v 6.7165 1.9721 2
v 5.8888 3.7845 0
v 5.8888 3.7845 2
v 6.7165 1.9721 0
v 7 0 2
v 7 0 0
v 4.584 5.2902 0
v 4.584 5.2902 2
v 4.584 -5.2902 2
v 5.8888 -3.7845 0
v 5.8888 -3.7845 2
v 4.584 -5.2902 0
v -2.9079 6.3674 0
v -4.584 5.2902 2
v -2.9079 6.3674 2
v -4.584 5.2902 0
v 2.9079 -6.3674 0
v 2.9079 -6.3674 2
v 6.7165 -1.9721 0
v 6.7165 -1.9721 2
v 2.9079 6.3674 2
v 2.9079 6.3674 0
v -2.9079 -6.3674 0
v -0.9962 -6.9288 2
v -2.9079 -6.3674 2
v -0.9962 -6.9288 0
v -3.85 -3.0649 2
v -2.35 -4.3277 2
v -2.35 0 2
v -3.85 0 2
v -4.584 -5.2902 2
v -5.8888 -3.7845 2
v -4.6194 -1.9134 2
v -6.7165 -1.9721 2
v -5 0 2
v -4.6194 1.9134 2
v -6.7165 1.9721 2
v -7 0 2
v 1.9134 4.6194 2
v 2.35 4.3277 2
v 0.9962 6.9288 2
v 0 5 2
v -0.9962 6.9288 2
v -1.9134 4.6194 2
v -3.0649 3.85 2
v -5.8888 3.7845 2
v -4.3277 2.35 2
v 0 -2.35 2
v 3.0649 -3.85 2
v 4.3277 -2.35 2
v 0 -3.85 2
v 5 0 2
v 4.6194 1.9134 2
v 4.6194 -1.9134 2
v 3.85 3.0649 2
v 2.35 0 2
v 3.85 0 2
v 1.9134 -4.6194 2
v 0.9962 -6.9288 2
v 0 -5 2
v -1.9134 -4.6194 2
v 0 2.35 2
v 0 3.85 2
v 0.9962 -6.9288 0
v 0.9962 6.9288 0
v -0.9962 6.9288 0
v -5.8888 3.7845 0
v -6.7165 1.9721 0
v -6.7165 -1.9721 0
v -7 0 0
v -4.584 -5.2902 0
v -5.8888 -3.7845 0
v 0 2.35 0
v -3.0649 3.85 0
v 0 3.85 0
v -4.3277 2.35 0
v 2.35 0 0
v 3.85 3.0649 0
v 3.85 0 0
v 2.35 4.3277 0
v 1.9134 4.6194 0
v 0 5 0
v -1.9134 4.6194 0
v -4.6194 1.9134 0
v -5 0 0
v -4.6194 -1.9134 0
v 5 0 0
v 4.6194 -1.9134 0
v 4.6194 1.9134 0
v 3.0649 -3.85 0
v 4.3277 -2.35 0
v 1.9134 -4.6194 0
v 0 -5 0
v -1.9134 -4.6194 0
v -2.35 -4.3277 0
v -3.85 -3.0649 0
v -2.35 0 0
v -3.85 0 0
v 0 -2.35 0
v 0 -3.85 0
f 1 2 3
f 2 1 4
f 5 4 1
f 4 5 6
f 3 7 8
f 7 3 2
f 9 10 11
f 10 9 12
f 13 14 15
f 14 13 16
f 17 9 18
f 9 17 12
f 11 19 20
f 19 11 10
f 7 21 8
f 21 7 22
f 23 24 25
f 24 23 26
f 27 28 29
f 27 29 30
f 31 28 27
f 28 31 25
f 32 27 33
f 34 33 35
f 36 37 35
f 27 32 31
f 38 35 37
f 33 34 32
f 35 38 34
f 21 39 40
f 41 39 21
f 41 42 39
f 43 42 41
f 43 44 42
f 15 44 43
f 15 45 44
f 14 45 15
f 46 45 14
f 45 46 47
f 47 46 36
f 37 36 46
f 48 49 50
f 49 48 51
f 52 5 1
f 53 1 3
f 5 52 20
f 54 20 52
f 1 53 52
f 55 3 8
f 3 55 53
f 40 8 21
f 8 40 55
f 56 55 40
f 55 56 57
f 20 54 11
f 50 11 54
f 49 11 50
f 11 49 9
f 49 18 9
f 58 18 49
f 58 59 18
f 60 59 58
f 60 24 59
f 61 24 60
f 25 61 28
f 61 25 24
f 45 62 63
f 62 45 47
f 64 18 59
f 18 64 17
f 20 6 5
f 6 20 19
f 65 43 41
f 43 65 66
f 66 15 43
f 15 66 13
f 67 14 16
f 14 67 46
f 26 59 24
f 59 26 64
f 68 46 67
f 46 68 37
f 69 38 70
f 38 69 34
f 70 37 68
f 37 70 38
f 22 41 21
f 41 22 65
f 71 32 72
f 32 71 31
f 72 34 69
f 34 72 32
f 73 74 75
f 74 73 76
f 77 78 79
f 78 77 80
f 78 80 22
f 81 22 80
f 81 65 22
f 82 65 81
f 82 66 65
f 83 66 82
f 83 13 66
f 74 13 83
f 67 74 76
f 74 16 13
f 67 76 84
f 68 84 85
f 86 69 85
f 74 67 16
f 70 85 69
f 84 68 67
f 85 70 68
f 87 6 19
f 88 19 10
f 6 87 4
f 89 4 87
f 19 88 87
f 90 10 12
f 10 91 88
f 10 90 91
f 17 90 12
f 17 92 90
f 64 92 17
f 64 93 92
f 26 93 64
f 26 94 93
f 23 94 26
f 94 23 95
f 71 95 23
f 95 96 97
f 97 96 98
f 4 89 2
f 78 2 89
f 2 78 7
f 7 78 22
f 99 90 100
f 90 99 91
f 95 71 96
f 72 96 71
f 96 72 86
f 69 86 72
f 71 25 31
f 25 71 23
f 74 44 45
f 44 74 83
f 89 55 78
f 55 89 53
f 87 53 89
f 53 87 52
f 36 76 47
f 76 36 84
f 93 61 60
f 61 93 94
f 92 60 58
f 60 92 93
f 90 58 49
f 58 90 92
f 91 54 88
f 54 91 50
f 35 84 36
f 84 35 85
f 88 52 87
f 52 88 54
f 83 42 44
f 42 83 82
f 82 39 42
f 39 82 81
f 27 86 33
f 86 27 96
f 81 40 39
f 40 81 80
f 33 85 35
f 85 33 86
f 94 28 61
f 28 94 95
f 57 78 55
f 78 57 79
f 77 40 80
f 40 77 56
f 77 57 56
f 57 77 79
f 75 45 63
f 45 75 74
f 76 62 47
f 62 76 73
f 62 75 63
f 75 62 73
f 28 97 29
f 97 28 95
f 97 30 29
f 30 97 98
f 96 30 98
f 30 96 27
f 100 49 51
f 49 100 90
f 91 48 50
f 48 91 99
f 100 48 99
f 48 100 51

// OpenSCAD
// this file just pulls out one module from picamera_2

use <../libs/cameras/picamera_2.scad>

picamera_2_lens_gripper();
